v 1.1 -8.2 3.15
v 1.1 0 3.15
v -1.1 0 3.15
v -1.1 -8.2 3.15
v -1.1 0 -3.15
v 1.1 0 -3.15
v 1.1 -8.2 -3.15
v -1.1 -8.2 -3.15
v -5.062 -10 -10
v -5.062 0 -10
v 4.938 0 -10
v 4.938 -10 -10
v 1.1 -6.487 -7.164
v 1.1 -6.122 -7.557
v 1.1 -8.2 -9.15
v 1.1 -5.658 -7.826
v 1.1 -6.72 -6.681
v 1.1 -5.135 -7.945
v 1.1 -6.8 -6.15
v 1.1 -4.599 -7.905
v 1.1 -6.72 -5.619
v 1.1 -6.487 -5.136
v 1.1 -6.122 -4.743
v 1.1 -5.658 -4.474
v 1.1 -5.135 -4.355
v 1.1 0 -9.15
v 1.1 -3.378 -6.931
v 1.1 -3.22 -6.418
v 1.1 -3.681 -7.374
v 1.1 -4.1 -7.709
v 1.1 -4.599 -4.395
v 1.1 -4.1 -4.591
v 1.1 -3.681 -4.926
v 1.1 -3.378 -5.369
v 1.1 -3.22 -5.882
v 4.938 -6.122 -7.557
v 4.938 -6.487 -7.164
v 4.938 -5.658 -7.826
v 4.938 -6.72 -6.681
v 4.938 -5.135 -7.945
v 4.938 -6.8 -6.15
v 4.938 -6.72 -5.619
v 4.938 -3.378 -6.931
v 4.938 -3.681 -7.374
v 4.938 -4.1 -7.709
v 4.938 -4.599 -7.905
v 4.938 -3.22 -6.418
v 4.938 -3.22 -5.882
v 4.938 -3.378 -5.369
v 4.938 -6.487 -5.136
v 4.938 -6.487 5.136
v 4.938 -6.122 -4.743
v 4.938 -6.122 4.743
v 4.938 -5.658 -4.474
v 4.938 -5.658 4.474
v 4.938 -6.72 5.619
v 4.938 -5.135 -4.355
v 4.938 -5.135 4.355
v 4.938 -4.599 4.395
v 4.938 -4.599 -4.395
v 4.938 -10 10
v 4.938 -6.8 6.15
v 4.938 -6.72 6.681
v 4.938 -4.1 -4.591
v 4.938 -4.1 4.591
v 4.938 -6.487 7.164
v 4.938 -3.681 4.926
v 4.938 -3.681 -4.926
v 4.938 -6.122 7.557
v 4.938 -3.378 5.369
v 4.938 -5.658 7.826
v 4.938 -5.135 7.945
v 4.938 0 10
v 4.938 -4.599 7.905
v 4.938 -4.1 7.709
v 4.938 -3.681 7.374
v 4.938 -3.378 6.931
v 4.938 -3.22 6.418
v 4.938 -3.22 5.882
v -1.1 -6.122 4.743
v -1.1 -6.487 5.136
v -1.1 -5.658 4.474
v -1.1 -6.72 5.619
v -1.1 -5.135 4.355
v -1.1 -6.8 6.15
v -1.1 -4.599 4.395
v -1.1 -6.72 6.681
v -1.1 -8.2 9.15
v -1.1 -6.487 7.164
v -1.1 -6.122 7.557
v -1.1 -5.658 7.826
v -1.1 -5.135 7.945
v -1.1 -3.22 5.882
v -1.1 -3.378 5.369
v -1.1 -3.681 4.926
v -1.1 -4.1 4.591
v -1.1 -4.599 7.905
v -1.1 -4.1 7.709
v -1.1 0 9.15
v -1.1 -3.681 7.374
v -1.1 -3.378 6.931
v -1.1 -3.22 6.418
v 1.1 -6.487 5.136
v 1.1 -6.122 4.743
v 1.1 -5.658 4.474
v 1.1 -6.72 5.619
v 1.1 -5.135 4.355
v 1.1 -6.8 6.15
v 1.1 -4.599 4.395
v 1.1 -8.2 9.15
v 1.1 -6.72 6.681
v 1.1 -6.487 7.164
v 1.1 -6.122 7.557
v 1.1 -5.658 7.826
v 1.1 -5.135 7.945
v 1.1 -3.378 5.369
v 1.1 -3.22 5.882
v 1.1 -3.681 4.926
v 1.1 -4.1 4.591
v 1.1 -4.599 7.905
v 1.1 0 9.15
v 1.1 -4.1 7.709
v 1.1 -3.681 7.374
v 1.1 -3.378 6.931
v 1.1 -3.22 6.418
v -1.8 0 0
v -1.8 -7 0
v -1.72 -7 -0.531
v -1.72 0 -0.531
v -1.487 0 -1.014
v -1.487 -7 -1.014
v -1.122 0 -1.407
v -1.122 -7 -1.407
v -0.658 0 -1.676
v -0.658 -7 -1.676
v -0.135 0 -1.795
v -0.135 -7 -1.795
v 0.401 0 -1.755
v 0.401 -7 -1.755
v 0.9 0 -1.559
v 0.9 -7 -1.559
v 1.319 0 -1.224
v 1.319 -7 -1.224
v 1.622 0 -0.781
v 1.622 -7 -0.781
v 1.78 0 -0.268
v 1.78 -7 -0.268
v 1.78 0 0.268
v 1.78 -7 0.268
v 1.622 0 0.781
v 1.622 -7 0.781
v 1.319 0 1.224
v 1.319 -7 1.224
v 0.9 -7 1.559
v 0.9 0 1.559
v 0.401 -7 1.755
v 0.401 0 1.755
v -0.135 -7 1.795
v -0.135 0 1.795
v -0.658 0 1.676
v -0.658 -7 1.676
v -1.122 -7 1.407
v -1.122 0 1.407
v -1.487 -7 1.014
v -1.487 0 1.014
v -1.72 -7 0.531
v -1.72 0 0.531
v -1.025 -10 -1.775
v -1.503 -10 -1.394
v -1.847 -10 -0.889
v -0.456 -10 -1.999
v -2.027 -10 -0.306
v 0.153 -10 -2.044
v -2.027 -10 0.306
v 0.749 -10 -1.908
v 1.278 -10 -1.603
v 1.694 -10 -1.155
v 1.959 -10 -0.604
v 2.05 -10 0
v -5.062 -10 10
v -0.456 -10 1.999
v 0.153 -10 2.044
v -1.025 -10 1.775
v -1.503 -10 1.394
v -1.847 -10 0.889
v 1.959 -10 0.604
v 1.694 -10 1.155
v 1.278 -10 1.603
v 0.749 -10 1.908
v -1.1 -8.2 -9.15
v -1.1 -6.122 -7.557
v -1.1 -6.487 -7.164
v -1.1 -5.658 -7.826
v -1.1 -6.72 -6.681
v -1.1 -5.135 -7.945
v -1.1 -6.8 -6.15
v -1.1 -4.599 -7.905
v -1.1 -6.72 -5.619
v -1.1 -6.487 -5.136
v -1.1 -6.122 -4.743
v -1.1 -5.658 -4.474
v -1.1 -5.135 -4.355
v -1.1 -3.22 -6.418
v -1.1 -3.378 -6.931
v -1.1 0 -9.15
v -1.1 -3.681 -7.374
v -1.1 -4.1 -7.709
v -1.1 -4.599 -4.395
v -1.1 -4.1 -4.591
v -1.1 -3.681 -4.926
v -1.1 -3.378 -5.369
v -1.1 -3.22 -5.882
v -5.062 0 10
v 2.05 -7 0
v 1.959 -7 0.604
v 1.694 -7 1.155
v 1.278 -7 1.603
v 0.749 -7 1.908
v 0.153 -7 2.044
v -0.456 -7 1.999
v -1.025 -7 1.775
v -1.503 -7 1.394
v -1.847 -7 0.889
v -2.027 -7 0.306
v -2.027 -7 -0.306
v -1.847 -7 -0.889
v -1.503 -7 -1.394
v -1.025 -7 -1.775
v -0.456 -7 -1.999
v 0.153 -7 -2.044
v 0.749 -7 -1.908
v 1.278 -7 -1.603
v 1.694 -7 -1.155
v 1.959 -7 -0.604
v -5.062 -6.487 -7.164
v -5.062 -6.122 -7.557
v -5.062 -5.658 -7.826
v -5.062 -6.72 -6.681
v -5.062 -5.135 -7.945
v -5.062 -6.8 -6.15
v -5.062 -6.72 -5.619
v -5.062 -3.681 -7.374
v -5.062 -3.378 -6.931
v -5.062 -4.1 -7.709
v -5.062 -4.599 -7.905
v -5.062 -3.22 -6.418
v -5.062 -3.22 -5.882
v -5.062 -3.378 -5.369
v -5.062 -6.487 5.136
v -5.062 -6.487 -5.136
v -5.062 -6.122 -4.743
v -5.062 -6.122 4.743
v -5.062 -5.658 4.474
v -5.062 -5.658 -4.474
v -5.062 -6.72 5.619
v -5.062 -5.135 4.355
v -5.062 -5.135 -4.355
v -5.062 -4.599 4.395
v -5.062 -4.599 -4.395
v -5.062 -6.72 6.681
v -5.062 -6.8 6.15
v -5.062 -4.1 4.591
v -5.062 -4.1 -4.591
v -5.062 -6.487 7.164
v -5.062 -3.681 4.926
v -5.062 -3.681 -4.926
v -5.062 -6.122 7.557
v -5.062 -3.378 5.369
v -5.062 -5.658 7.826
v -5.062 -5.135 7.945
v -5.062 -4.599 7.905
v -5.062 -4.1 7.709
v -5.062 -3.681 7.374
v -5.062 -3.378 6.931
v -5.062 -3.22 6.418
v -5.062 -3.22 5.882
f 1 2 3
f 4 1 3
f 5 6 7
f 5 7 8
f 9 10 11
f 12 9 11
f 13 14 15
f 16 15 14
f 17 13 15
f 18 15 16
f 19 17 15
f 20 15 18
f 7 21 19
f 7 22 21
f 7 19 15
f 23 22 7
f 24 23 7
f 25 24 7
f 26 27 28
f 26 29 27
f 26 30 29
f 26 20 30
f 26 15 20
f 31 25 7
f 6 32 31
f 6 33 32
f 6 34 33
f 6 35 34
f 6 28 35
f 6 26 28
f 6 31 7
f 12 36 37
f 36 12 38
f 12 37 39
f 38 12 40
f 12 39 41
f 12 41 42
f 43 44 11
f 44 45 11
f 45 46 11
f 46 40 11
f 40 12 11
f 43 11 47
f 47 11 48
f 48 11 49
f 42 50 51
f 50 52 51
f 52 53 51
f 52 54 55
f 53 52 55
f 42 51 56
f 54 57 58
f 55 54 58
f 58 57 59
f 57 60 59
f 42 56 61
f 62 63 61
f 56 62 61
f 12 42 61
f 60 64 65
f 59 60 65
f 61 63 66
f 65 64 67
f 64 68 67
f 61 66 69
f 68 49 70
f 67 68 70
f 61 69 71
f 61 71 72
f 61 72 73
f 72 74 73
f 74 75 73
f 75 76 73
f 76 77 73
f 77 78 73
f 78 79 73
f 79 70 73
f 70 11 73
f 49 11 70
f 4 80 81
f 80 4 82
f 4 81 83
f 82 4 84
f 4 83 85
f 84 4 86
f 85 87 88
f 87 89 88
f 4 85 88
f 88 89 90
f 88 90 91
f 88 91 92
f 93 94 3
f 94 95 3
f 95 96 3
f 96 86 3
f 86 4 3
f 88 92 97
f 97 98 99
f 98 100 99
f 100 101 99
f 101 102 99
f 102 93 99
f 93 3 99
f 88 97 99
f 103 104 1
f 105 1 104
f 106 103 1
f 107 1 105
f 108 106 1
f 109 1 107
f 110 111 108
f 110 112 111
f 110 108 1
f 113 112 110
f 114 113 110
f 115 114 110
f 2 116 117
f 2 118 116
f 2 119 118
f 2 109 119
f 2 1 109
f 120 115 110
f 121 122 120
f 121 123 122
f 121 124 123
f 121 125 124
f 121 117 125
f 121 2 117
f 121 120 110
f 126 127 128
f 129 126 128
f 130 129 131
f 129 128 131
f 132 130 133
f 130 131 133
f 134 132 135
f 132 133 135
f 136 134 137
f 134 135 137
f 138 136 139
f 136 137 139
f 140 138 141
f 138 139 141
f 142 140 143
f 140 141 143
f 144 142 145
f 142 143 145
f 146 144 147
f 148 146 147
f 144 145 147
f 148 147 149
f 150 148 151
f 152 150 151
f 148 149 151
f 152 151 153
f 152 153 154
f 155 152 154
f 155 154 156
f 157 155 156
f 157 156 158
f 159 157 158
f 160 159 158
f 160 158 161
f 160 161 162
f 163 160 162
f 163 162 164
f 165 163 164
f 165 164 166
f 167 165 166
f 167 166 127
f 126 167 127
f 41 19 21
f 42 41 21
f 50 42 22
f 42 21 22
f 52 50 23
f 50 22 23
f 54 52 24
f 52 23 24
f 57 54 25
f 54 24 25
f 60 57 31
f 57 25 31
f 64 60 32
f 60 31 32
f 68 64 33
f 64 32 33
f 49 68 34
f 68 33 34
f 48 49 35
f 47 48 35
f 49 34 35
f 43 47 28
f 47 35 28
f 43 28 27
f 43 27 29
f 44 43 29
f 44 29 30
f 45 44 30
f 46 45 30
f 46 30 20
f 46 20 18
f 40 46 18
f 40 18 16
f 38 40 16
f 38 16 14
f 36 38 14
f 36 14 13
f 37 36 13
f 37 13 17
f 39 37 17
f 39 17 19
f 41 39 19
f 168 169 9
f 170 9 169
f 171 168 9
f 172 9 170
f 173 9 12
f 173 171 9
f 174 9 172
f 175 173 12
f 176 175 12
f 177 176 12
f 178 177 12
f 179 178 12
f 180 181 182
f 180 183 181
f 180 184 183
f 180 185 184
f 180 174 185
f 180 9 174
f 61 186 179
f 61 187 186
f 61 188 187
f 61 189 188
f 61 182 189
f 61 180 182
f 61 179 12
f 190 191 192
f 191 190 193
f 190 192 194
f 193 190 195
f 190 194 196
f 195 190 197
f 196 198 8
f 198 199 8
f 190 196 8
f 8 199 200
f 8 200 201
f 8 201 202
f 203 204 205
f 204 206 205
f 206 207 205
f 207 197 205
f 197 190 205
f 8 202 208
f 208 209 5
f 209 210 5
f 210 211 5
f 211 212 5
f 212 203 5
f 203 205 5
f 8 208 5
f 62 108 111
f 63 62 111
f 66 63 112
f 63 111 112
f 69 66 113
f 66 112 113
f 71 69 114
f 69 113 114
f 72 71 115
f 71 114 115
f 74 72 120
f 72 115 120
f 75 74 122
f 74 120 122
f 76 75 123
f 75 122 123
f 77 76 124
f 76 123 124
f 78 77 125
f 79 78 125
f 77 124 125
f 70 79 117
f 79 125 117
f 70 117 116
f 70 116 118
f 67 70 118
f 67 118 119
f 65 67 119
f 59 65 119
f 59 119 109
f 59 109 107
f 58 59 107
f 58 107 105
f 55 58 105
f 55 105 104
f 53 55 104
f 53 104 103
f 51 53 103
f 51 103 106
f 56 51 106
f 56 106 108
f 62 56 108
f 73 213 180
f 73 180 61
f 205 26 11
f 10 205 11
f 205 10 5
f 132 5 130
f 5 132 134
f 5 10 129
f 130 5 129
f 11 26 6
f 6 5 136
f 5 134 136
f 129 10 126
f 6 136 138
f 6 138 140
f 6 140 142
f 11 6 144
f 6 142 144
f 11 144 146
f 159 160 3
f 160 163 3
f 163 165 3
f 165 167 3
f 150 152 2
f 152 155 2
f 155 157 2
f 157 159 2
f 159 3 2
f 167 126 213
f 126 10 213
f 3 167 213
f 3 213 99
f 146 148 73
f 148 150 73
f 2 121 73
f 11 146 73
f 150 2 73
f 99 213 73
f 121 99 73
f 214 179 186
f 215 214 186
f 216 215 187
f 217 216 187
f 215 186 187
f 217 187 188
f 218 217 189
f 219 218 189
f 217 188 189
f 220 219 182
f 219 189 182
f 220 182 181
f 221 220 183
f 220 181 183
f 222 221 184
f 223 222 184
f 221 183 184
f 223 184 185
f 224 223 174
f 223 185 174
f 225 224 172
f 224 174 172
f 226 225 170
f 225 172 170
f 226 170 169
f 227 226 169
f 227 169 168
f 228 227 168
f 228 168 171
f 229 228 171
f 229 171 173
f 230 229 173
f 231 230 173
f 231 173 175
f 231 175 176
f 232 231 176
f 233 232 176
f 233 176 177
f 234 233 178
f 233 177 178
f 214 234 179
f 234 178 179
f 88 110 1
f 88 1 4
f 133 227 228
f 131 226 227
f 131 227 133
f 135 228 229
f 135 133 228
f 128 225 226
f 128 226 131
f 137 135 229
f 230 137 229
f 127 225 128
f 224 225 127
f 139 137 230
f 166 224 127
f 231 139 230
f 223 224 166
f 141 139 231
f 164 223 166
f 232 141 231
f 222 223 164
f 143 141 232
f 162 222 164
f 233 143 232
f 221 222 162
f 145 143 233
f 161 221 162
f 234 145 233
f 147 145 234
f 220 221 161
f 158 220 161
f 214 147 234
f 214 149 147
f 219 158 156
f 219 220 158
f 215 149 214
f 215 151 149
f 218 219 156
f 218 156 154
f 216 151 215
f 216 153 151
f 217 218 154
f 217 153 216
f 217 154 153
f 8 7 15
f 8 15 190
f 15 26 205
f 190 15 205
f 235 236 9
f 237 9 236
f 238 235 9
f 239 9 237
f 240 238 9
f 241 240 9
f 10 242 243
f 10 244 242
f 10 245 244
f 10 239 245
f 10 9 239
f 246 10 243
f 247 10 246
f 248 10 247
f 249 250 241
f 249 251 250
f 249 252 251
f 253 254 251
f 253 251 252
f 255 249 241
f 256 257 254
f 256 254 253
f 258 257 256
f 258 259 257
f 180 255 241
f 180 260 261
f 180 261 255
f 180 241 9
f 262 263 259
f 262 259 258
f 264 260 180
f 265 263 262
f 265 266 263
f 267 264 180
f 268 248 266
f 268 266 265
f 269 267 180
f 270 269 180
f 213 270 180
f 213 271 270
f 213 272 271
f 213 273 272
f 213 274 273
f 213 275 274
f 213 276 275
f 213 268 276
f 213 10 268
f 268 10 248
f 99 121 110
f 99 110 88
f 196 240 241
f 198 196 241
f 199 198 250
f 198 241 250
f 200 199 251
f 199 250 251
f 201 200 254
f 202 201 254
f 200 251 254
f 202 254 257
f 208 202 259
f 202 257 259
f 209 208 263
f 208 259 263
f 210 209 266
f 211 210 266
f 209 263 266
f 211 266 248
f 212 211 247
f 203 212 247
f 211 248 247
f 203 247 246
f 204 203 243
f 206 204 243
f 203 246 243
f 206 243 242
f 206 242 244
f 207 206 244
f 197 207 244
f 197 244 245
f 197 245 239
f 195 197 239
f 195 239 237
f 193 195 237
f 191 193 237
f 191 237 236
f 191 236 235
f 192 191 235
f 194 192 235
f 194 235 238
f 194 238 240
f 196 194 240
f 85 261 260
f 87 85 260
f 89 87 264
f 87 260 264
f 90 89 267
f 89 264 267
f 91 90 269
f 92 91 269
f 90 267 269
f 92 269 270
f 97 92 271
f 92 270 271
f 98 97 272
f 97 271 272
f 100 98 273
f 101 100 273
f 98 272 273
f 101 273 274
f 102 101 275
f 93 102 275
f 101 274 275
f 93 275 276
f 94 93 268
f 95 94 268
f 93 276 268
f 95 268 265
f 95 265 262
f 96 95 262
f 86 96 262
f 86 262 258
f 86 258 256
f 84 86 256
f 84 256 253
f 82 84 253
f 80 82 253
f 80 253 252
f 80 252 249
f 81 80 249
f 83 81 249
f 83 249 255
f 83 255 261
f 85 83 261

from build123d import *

# Parameters (mm, degrees)
F0_W     = 10
F0_H     = 20
F1_DEPTH = 10
F2_W     = 2.2
F2_H     = 6
F3_DEPTH = 8.2
F4_R     = 2.05
F5_DEPTH = 3
F6_D     = 3.6
F8_D     = 3.6


with BuildPart() as f1:
    # F0 (on Front) → F1 (new body)
    with BuildSketch(Plane.XZ):
        with Locations((-0.0625, 0)):
            Rectangle(F0_W, F0_H)
    extrude(amount=F1_DEPTH)

    # F2 (on face) → F3 (cut)
    with BuildSketch(Plane(origin=(0, 0, 0), x_dir=(-1, 0, 0), z_dir=(0, 1, 0))):
        with Locations((0, 6.15)):
            Rectangle(F2_W, F2_H)
        with Locations((0, -6.15)):
            Rectangle(F2_W, F2_H)
    extrude(amount=-F3_DEPTH, mode=Mode.SUBTRACT)

    # F4 (on face) → F5 (cut)
    with BuildSketch(Plane.XZ.offset(10)):
        Circle(F4_R)
    extrude(amount=-F5_DEPTH, mode=Mode.SUBTRACT)

    # F6 (through all)
    with Locations(Plane(origin=(0, 0, 0), x_dir=(1, 0, 0), z_dir=(0, 1, 0))):
        with Locations((0, 0)):
            Hole(F6_D / 2)

    # F8 (through all)
    with Locations(Plane.YZ.offset(4.9375)):
        with Locations((-5, -6.15), (-5, 6.15)):
            Hole(F8_D / 2)


solid = f1.part
